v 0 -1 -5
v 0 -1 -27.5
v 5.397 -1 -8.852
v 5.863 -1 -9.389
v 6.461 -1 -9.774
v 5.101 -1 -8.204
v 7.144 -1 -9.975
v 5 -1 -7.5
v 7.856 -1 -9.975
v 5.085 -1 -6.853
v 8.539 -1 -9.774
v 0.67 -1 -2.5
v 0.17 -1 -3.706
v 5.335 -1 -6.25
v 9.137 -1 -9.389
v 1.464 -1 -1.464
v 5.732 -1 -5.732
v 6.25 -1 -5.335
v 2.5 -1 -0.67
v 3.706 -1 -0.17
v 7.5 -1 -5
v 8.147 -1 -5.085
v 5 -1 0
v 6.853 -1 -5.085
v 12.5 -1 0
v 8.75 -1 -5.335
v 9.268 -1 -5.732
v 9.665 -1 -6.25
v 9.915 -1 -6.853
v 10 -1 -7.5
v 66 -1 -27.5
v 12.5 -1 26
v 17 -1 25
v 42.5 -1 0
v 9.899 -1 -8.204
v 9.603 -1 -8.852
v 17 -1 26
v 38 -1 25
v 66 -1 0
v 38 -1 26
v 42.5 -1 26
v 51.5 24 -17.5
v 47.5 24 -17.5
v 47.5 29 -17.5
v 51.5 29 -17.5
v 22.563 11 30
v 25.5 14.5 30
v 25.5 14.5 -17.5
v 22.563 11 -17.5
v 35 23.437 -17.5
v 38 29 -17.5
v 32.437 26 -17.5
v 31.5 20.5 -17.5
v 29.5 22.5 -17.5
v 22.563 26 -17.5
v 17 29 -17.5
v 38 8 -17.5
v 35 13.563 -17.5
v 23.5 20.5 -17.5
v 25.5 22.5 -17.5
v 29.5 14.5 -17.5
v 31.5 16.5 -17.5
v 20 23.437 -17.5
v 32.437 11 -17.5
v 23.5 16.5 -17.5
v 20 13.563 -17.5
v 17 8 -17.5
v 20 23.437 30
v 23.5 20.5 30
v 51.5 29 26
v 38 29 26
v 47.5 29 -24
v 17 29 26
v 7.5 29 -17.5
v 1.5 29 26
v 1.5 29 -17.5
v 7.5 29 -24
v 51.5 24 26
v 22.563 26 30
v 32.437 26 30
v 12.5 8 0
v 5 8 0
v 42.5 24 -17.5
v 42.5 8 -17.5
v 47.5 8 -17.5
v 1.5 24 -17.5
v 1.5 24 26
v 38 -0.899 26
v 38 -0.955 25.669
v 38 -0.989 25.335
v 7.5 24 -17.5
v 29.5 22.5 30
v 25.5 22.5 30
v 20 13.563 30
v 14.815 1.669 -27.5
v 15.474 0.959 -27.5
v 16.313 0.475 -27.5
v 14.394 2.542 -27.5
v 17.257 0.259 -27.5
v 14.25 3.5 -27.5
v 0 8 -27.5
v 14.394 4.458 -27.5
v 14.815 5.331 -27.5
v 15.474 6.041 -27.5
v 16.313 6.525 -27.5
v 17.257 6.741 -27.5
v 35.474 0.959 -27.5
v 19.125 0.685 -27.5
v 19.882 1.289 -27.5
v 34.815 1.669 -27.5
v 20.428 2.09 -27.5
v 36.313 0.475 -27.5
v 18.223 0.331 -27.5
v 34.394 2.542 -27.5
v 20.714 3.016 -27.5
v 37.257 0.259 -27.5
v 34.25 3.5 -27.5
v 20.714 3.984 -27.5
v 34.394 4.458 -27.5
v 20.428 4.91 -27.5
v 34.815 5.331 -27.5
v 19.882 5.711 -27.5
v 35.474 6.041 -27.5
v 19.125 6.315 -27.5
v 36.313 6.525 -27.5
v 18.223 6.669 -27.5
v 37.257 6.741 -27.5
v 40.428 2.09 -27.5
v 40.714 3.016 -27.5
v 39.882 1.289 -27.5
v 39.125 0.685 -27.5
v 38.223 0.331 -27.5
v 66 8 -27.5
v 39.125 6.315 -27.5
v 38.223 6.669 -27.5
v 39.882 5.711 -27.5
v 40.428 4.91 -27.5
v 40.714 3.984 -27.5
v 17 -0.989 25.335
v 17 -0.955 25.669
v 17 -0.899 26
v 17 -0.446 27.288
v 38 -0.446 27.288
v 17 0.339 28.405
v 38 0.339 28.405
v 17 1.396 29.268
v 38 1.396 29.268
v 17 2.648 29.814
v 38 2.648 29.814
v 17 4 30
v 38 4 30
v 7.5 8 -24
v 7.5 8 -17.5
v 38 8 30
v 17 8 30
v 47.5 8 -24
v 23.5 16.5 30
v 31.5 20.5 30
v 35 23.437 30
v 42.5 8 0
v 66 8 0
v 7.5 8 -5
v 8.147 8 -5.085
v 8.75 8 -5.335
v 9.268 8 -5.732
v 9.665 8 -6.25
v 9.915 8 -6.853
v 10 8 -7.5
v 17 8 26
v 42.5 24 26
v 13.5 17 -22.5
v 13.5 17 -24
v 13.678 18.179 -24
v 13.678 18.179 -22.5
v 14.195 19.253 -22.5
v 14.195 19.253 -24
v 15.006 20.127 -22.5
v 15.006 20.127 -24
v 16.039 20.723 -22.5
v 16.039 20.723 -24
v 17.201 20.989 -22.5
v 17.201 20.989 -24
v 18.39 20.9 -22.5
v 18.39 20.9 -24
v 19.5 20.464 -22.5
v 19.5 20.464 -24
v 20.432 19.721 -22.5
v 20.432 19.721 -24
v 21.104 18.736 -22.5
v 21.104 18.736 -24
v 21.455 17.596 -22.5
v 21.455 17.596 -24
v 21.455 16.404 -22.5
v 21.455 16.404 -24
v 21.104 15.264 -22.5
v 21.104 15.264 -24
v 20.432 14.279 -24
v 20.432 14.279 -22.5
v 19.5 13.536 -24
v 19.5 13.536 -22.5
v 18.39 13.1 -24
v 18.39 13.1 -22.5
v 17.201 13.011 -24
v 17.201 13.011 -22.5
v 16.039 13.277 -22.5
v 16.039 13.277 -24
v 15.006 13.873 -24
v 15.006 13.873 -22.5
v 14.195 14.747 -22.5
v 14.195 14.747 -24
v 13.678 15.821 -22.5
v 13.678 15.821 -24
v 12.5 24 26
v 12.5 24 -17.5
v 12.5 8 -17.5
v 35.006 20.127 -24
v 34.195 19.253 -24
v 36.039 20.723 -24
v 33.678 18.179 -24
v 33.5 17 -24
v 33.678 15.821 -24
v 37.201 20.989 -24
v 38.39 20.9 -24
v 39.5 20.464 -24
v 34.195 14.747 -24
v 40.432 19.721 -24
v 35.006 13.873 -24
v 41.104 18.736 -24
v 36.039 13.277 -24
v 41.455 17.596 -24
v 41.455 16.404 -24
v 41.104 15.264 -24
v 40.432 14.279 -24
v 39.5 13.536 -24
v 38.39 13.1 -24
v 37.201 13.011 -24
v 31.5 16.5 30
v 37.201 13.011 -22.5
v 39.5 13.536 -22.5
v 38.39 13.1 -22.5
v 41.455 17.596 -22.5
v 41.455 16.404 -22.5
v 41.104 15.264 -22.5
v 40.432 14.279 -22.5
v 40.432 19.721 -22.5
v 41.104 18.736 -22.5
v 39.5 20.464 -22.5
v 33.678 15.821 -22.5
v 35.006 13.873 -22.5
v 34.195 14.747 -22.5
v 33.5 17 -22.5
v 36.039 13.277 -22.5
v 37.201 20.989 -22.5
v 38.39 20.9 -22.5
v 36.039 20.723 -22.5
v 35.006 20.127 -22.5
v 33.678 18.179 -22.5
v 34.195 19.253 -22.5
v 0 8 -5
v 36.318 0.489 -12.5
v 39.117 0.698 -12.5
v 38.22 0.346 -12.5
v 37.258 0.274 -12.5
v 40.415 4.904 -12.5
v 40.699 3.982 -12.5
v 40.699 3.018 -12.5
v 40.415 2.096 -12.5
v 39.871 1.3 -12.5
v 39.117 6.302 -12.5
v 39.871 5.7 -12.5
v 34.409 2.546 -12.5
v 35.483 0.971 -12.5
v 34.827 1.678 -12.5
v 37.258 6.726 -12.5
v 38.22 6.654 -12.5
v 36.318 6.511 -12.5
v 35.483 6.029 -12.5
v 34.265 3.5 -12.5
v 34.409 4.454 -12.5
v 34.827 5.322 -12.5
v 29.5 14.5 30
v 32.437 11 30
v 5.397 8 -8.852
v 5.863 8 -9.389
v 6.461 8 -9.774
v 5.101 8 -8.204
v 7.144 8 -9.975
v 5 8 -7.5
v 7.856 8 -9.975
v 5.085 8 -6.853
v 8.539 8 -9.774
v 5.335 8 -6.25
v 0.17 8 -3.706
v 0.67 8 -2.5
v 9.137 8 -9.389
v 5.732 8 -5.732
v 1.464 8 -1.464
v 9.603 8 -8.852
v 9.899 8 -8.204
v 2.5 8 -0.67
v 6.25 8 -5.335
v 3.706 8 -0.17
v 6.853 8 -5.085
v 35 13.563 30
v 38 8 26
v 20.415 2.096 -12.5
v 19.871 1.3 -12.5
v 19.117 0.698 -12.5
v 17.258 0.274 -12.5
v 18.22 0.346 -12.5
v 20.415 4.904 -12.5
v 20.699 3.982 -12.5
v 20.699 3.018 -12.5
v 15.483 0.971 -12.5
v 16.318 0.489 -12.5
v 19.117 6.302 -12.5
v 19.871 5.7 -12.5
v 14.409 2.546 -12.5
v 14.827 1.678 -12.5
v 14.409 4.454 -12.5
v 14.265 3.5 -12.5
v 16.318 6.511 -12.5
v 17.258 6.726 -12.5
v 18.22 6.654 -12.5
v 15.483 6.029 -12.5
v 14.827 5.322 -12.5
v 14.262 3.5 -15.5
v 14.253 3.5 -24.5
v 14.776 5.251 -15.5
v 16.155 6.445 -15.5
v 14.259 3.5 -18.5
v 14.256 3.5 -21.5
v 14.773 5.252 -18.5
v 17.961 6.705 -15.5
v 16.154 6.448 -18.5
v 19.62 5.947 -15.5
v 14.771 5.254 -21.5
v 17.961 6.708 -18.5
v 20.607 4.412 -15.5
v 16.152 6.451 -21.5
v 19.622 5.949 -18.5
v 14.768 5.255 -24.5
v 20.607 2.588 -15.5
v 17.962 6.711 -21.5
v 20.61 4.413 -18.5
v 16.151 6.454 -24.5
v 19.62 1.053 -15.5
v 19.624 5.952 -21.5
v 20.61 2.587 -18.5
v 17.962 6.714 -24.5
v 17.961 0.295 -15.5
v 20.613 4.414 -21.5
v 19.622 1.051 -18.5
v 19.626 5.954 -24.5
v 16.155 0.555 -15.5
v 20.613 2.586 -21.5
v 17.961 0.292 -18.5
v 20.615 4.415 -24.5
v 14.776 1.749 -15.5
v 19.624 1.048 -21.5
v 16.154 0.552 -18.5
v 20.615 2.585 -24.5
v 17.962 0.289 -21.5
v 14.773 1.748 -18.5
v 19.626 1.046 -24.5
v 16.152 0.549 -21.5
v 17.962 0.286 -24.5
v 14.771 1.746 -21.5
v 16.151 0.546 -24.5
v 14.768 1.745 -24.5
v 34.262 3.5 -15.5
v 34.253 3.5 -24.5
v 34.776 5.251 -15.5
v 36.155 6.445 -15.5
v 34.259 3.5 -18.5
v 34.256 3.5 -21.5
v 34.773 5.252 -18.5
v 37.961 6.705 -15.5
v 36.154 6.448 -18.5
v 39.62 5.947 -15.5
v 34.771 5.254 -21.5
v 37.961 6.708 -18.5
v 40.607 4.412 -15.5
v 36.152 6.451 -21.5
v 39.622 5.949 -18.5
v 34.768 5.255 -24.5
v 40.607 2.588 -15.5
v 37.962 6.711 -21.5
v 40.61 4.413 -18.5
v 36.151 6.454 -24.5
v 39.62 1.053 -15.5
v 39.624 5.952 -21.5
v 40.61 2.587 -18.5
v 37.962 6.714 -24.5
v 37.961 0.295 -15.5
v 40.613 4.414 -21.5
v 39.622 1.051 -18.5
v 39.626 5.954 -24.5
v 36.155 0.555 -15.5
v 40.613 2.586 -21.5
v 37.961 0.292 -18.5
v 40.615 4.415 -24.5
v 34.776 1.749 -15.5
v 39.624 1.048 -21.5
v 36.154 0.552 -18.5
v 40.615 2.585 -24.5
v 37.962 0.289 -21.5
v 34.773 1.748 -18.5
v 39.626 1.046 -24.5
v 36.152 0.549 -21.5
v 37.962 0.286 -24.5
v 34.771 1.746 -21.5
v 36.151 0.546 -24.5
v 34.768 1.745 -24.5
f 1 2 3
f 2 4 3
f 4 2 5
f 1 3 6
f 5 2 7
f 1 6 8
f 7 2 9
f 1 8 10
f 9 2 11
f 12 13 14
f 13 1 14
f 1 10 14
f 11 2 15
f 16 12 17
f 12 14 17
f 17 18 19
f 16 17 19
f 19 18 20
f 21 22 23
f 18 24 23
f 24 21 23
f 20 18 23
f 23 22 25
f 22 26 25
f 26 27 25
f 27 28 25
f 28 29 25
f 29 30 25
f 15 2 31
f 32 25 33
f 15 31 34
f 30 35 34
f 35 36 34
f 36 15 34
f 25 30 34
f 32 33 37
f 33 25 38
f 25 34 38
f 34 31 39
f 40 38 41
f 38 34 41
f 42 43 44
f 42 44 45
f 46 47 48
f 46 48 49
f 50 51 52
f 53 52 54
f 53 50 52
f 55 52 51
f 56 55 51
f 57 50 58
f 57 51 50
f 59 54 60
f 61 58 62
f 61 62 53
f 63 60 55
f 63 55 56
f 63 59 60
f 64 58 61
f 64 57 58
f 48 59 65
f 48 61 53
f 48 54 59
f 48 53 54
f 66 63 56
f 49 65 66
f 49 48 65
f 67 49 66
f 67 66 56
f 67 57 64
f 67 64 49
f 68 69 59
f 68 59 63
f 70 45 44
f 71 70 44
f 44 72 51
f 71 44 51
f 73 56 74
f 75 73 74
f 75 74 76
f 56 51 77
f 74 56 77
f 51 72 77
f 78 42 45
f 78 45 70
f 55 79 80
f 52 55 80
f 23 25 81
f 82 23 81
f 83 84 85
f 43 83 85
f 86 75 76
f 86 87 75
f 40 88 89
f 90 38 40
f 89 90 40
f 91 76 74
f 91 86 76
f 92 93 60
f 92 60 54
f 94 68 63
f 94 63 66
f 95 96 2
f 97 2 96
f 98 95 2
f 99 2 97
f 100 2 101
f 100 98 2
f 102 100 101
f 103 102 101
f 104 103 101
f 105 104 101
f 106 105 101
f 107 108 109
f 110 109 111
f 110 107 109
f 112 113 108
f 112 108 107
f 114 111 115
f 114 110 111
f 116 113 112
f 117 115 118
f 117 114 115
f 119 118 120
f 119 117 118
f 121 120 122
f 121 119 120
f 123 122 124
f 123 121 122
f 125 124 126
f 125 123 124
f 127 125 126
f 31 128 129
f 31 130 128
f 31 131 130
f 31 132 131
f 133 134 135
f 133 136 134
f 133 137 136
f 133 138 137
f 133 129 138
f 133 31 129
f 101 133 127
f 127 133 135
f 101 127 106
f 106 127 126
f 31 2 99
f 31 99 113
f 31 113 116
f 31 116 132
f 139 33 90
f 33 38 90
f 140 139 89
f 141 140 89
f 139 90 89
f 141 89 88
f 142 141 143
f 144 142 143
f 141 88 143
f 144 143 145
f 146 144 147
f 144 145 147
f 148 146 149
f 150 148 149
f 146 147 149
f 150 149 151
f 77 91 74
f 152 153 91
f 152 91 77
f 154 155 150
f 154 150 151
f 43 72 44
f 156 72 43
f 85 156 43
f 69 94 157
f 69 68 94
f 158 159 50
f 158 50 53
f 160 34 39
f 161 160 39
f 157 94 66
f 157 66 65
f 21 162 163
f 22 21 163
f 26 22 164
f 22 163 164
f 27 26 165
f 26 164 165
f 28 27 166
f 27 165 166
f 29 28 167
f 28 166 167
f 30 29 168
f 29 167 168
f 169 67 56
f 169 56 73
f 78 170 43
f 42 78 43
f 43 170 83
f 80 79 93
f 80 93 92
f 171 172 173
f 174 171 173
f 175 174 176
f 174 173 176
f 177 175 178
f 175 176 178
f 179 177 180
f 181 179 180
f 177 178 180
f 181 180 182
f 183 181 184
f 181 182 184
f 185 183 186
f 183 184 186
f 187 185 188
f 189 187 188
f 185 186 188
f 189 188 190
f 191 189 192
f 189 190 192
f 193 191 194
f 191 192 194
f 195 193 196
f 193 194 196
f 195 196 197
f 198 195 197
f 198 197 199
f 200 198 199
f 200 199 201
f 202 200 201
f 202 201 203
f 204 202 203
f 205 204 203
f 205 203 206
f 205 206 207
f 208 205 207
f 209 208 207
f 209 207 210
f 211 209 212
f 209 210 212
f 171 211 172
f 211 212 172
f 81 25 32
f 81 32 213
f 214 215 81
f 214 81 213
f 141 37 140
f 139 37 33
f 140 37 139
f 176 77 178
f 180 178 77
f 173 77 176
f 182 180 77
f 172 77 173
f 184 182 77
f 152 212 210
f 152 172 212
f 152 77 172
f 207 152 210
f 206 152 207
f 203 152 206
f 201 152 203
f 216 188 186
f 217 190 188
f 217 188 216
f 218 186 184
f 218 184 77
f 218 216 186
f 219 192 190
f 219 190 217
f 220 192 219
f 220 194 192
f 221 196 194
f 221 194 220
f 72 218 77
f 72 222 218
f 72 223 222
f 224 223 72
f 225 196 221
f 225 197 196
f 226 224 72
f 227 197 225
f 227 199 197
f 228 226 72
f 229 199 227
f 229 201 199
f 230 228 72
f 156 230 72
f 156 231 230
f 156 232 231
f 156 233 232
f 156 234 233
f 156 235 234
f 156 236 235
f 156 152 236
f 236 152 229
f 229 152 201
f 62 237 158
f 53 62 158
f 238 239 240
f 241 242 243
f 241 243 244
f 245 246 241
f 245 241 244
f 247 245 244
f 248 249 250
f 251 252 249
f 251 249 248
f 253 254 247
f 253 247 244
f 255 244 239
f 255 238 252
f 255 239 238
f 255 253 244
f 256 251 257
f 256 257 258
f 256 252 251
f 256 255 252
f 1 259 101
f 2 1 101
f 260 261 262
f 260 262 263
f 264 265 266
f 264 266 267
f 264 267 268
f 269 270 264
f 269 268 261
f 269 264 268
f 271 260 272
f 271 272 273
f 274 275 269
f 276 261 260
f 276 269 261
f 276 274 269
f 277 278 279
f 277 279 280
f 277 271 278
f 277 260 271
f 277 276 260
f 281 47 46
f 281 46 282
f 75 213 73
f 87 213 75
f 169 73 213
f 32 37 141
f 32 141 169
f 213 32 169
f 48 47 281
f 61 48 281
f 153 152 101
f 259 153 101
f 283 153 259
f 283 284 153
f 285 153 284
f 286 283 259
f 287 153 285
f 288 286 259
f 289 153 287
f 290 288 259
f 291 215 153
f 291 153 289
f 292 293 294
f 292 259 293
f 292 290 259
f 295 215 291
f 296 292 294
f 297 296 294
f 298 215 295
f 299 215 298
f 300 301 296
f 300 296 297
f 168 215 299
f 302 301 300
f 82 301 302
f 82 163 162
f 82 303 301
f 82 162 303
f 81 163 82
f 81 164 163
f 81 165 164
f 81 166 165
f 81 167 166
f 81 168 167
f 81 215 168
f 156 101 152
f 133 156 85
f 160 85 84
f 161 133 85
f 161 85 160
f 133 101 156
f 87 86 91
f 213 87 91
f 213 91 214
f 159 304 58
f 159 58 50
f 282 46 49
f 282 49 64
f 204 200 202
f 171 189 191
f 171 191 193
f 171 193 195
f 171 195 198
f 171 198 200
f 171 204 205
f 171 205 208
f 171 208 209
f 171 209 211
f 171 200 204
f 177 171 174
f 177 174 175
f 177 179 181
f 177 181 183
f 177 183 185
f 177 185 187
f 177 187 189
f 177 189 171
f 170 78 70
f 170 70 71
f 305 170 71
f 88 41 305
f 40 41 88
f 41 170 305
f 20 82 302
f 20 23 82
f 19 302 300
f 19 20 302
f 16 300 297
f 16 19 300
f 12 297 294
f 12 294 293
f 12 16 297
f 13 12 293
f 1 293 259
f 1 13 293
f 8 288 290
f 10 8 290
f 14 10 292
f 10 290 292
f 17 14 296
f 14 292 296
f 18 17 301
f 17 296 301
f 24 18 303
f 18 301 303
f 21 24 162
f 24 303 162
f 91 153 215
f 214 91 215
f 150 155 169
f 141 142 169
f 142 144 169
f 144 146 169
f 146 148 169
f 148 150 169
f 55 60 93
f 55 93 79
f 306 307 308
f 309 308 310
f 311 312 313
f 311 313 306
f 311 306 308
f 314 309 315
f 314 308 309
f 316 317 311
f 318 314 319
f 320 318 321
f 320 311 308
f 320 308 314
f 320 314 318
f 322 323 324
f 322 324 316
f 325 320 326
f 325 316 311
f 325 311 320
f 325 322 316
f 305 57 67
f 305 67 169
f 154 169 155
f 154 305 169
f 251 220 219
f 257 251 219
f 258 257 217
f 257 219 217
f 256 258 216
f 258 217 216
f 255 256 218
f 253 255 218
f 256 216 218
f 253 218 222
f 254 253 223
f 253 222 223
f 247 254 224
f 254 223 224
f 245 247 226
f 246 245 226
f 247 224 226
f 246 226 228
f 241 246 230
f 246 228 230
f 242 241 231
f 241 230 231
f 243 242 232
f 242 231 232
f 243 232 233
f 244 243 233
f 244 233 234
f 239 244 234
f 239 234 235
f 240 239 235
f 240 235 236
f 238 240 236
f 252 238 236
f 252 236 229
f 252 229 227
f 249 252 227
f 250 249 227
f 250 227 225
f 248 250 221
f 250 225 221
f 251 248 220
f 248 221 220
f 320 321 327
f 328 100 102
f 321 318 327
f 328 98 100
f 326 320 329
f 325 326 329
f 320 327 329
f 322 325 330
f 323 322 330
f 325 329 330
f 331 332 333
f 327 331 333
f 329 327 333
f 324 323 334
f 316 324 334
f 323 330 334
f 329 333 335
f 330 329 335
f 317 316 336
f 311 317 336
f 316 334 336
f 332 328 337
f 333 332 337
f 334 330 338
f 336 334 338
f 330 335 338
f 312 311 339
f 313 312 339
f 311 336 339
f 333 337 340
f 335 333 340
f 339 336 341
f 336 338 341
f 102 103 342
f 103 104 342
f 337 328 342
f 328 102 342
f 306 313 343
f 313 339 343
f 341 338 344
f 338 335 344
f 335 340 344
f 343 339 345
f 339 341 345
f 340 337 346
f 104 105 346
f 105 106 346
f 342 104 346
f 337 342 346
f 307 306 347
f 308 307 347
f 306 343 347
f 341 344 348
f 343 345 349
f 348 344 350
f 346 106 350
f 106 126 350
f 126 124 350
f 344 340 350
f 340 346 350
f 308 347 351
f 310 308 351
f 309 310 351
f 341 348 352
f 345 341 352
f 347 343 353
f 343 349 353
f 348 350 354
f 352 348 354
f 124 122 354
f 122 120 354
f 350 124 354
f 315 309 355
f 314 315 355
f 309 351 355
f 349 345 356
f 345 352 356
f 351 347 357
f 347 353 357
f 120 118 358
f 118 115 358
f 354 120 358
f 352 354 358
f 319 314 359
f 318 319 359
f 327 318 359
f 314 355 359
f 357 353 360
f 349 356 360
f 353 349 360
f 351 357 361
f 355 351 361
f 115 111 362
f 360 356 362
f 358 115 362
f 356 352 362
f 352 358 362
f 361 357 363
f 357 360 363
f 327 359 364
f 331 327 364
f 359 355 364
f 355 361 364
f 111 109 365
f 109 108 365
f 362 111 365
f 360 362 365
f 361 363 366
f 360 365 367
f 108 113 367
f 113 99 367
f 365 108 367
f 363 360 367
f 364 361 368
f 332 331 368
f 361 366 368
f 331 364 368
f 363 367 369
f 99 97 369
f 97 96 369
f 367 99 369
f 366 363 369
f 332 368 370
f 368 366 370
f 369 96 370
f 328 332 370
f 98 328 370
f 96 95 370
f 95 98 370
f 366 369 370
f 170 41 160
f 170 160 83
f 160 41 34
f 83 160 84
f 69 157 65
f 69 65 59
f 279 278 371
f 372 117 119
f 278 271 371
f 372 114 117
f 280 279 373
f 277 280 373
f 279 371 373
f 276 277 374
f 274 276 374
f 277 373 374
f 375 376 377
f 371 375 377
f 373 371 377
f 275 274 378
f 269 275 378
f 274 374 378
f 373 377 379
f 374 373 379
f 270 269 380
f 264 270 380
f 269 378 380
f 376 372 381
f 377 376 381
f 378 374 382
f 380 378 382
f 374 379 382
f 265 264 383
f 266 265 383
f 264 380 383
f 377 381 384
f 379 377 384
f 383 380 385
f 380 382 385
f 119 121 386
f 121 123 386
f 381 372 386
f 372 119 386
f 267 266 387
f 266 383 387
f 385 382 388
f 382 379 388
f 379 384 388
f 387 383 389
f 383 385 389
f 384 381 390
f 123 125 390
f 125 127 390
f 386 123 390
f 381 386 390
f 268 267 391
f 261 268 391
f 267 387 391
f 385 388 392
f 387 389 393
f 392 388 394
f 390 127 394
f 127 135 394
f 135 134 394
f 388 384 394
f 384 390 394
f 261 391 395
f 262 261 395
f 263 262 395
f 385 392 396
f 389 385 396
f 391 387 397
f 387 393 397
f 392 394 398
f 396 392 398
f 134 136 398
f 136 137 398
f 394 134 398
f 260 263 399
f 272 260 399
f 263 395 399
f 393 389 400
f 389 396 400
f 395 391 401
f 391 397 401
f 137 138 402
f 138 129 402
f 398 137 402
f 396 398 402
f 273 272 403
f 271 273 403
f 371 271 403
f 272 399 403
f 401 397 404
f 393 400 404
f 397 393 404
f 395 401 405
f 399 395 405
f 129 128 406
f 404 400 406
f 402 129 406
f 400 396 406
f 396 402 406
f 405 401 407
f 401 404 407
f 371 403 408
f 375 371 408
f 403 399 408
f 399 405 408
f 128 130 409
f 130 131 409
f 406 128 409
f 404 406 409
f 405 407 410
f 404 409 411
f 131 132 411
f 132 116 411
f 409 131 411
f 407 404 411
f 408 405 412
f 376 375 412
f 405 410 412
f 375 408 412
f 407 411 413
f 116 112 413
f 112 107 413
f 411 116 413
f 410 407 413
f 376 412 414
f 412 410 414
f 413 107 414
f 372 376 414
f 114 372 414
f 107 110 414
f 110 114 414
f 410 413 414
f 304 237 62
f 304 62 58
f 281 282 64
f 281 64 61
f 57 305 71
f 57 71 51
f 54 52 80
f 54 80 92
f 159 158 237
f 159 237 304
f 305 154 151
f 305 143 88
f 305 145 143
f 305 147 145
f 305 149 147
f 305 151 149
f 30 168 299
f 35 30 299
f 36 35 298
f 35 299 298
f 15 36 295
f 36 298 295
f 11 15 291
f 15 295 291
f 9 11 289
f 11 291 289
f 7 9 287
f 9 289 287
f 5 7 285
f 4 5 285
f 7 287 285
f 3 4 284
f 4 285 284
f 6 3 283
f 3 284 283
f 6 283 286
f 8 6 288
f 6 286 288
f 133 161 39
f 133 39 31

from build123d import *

# Parameters (mm, degrees)
BOSS_EXTRUDE2_DEPTH          = 8
BOSS_EXTRUDE2_DEPTH_BACK     = 1
SKETCH1_R                    = 2.5
CUT_EXTRUDE1_DEPTH           = 79.300702423
CUT_EXTRUDE1_DEPTH_BACK      = 79.300702423
SKETCH2_R                    = 2.5
SKETCH3_R                    = 3.25
CUT_EXTRUDE5_DEPTH           = 15
CUT_EXTRUDE5_DRAFT           = -0.0573
CUT_EXTRUDE5_PROFILE_2_DEPTH = 15
CUT_EXTRUDE5_PROFILE_2_DRAFT = -0.0573
SKETCH5_W                    = 9
SKETCH5_H                    = 6.5
BOSS_EXTRUDE3_DEPTH          = 14.5
CUT_EXTRUDE4_DEPTH           = 1.5
SKETCH12_W                   = 21
SKETCH12_H                   = 30
BOSS_EXTRUDE7_DEPTH          = 9
SKETCH15_W                   = 9
SKETCH15_H                   = 6.5
BOSS_EXTRUDE8_DEPTH          = 3.5
BOSS_EXTRUDE9_DEPTH          = 54
FILLET4_R                    = 5
SKETCH18_W                   = 9.873697418
SKETCH18_H                   = 6.5
BOSS_EXTRUDE11_DEPTH         = 0.5
SKETCH20_W                   = 4
SKETCH20_H                   = 17.5
BOSS_EXTRUDE12_DEPTH         = 18
BOSS_EXTRUDE13_DEPTH         = 11
BOSS_EXTRUDE13_DEPTH_BACK    = 4
SKETCH22_W                   = 17.5
SKETCH22_H                   = 4
SKETCH25_W                   = 2
SKETCH25_H                   = 17.5
BOSS_EXTRUDE14_DEPTH         = 41
SKETCH28_W                   = 41
SKETCH28_H                   = 45
BOSS_EXTRUDE15_DEPTH         = 2
SKETCH29_R                   = 1.75
CUT_EXTRUDE8_DEPTH           = 9
BOSS_EXTRUDE16_DEPTH         = 9
BOSS_EXTRUDE16_DEPTH_BACK    = 4
SKETCH30_W                   = 17.5
SKETCH30_H                   = 4
SKETCH31_R                   = 10
CUT_EXTRUDE9_DEPTH           = 9
SKETCH32_W                   = 13
SKETCH32_H                   = 4
BOSS_EXTRUDE17_DEPTH         = 23.5
SKETCH33_W                   = 0.5
SKETCH33_H                   = 17.5
BOSS_EXTRUDE18_DEPTH         = 20
BOSS_EXTRUDE19_DEPTH         = 26
SKETCH35_W                   = 9.873697418
SKETCH35_H                   = 0.5
BOSS_EXTRUDE20_DEPTH         = 47.5
BOSS_EXTRUDE21_DEPTH         = 47.5
SKETCH38_W                   = 0.419549816
SKETCH38_H                   = 18.5
CUT_EXTRUDE10_DEPTH          = 90.5
SKETCH46_W                   = 27.5
SKETCH46_H                   = 9
BOSS_EXTRUDE26_DEPTH         = 11.5
SKETCH47_W                   = 27.5
SKETCH47_H                   = 9
BOSS_EXTRUDE27_DEPTH         = 11
SKETCH48_W                   = 15.5
SKETCH48_H                   = 6.5
BOSS_EXTRUDE31_DEPTH         = 18.5
SKETCH50_R                   = 4
CUT_EXTRUDE11_DEPTH          = 1.5
SKETCH51_W                   = 9.626242636
SKETCH51_H                   = 9.125298808
BOSS_EXTRUDE32_DEPTH         = 1.5
SKETCH54_W                   = 8
SKETCH54_H                   = 8
BOSS_EXTRUDE35_DEPTH         = 47.5
SKETCH55_W                   = 9.873697418
SKETCH55_H                   = 0.5
CUT_EXTRUDE12_DEPTH          = 47.5
BOSS_EXTRUDE37_DEPTH         = 47.5
CUT_EXTRUDE17_DEPTH          = 47.5
SKETCH62_W                   = 8
SKETCH62_H                   = 8
CUT_EXTRUDE18_DEPTH          = 47.5
SKETCH63_W                   = 13
SKETCH63_H                   = 4
CUT_EXTRUDE20_DEPTH          = 17
SKETCH64_W                   = 0.5
SKETCH64_H                   = 1.5
BOSS_EXTRUDE38_DEPTH         = 6.5
SKETCH65_W                   = 11
SKETCH65_H                   = 27.5
SKETCH65_R                   = 2.5
CUT_EXTRUDE22_DEPTH          = 9
FILLET6_R                    = 5
BOSS_EXTRUDE39_DEPTH         = 11
BOSS_EXTRUDE39_DEPTH_BACK    = 10
SKETCH67_W                   = 27.5
SKETCH67_H                   = 9
SKETCH68_W                   = 2
SKETCH68_H                   = 45
CUT_EXTRUDE23_DEPTH          = 17
SKETCH69_W                   = 2
SKETCH69_H                   = 41
CUT_EXTRUDE24_DEPTH          = 37
CUT_EXTRUDE25_DEPTH          = 6.5
SKETCH71_W                   = 40
SKETCH71_H                   = 6.5
BOSS_EXTRUDE40_DEPTH         = 1.5
BOSS_EXTRUDE41_DEPTH         = 1


with BuildPart() as part:
    # Sketch1 → Boss-Extrude2 (new, two sides: drawn at the far end of the back side and taken through both)
    with BuildSketch(Plane(origin=(0, 0, 0), x_dir=(1, 0, 0), z_dir=(0, 1, 0)).offset(-BOSS_EXTRUDE2_DEPTH_BACK)):
        with BuildLine():
            Line((5, 0), (50, 0))
            ThreePointArc((50, 0), (53.535533906, 1.464466094), (55, 5))
            Line((55, 5), (55, 50))
            ThreePointArc((55, 50), (53.535533906, 53.535533906), (50, 55))
            Line((50, 55), (5, 55))
            ThreePointArc((5, 55), (1.464466094, 53.535533906), (0, 50))
            Line((0, 50), (0, 5))
            ThreePointArc((0, 5), (1.464466094, 1.464466094), (5, 0))
        make_face()
        with Locations((7.5, 47.5)):
            Circle(SKETCH1_R, mode=Mode.SUBTRACT)
        with Locations((47.5, 47.5)):
            Circle(SKETCH1_R, mode=Mode.SUBTRACT)
        with Locations((47.5, 7.5)):
            Circle(SKETCH1_R, mode=Mode.SUBTRACT)
        with Locations((7.5, 7.5)):
            Circle(SKETCH1_R, mode=Mode.SUBTRACT)
    extrude(amount=BOSS_EXTRUDE2_DEPTH + BOSS_EXTRUDE2_DEPTH_BACK)

    # Sketch2 → Cut-Extrude1 (cut, two sides: drawn at the far end of the back side and taken through both)
    with BuildSketch(Plane(origin=(0, 8, 0), x_dir=(1, 0, 0), z_dir=(0, 1, 0)).offset(-CUT_EXTRUDE1_DEPTH_BACK)):
        with BuildLine():
            Line((0, 50), (0, 27.5))
            Line((0, 27.5), (55, 27.5))
            Line((55, 27.5), (55, 50))
            ThreePointArc((55, 50), (53.535533906, 53.535533906), (50, 55))
            Line((50, 55), (5, 55))
            ThreePointArc((5, 55), (1.464466094, 53.535533906), (0, 50))
        make_face()
        with Locations((7.5, 47.5)):
            Circle(SKETCH2_R, mode=Mode.SUBTRACT)
        with Locations((47.5, 47.5)):
            Circle(SKETCH2_R, mode=Mode.SUBTRACT)
    extrude(amount=CUT_EXTRUDE1_DEPTH + CUT_EXTRUDE1_DEPTH_BACK, mode=Mode.SUBTRACT)


with BuildPart() as cut_extrude5_tool:
    # Sketch3 → Cut-Extrude5 (with draft: the straight prism first)
    with BuildSketch(Plane(origin=(0, 0, -27.5), x_dir=(-1, 0, 0), z_dir=(0, 0, -1))):
        with Locations((-37.5, 3.5)):
            Circle(SKETCH3_R)
    extrude(amount=-CUT_EXTRUDE5_DEPTH)
    # Cut-Extrude5: the draft: its side faces are tilted about the plane it starts from
    cut_extrude5_sides = [cut_extrude5_tool.faces().sort_by_distance(p)[0] for p in [
        (40.75, 3.5, -20),
    ]]
    draft(cut_extrude5_sides, Plane(origin=(0, 0, -27.5), x_dir=(-1, 0, 0), z_dir=(0, 0, -1)), CUT_EXTRUDE5_DRAFT)


with BuildPart() as part_1:
    add(part.part)

    # Cut-Extrude5: cut by cut_extrude5_tool
    add(cut_extrude5_tool.part, mode=Mode.SUBTRACT)


with BuildPart() as cut_extrude5_profile_2_tool:
    # Sketch3 → Cut-Extrude5 profile 2 (with draft: the straight prism first)
    with BuildSketch(Plane(origin=(0, 0, -27.5), x_dir=(-1, 0, 0), z_dir=(0, 0, -1))):
        with Locations((-17.5, 3.5)):
            Circle(SKETCH3_R)
    extrude(amount=-CUT_EXTRUDE5_PROFILE_2_DEPTH)
    # Cut-Extrude5 profile 2: the draft: its side faces are tilted about the plane it starts from
    cut_extrude5_profile_2_sides = [cut_extrude5_profile_2_tool.faces().sort_by_distance(p)[0] for p in [
        (20.75, 3.5, -20),
    ]]
    draft(cut_extrude5_profile_2_sides, Plane(origin=(0, 0, -27.5), x_dir=(-1, 0, 0), z_dir=(0, 0, -1)), CUT_EXTRUDE5_PROFILE_2_DRAFT)


with BuildPart() as part_2:
    add(part_1.part)

    # Cut-Extrude5 profile 2: cut by cut_extrude5_profile_2_tool
    add(cut_extrude5_profile_2_tool.part, mode=Mode.SUBTRACT)

    # Sketch5 → Boss-Extrude3 (add)
    with BuildSketch(Plane(origin=(0, 8, 0), x_dir=(1, 0, 0), z_dir=(0, 1, 0))):
        with Locations((27.5, 20.75)):
            Rectangle(SKETCH5_W, SKETCH5_H)
    extrude(amount=BOSS_EXTRUDE3_DEPTH)

    # Sketch6 → Cut-Extrude4 (cut)
    with BuildSketch(Plane(origin=(0, 0, -24), x_dir=(-1, 0, 0), z_dir=(0, 0, -1))):
        with BuildLine():
            ThreePointArc((-27.5, 13), (-24.671572875, 14.171572875), (-23.5, 17))
            ThreePointArc((-23.5, 17), (-30.328427125, 19.828427125), (-27.5, 13))
        make_face()
    extrude(amount=-CUT_EXTRUDE4_DEPTH, mode=Mode.SUBTRACT)

    # Sketch12 → Boss-Extrude7 (add)
    with BuildSketch(Plane(origin=(0, 8, 0), x_dir=(1, 0, 0), z_dir=(0, 1, 0))):
        with Locations((27.5, -15)):
            Rectangle(SKETCH12_W, SKETCH12_H)
    extrude(amount=-BOSS_EXTRUDE7_DEPTH)

    # Sketch15 → Boss-Extrude8 (add)
    with BuildSketch(Plane(origin=(0, 22.5, 0), x_dir=(1, 0, 0), z_dir=(0, 1, 0))):
        with Locations((27.5, 20.75)):
            Rectangle(SKETCH15_W, SKETCH15_H)
    extrude(amount=BOSS_EXTRUDE8_DEPTH)

    # Sketch11 → Boss-Extrude9 (add)
    with BuildSketch(Plane(origin=(0, 0, -24), x_dir=(-1, 0, 0), z_dir=(0, 0, -1))):
        Polygon((-29.5, 22.5), (-25.5, 22.5), (-22.563151291, 26), (-32.436848709, 26), align=None)
    extrude(amount=-BOSS_EXTRUDE9_DEPTH)

    # Fillet4
    fillet4_edges = [part_2.edges().sort_by_distance(p)[0] for p in [
        (27.5, -1, 30),
    ]]
    fillet(fillet4_edges, radius=FILLET4_R)

    # Sketch18 → Boss-Extrude11 (add)
    with BuildSketch(Plane(origin=(0, 26, 0), x_dir=(1, 0, 0), z_dir=(0, 1, 0))):
        with Locations((27.5, 20.75)):
            Rectangle(SKETCH18_W, SKETCH18_H)
    extrude(amount=BOSS_EXTRUDE11_DEPTH)

    # Sketch20 → Boss-Extrude12 (add)
    with BuildSketch(Plane(origin=(0, 8, 0), x_dir=(1, 0, 0), z_dir=(0, 1, 0))):
        with Locations((14.5, 8.75)):
            Rectangle(SKETCH20_W, SKETCH20_H)
        with Locations((40.5, 8.75)):
            Rectangle(SKETCH20_W, SKETCH20_H)
    extrude(amount=BOSS_EXTRUDE12_DEPTH)

    # Sketch22 → Boss-Extrude13 (add, two sides: drawn at the far end of the back side and taken through both)
    with BuildSketch(Plane.ZY.offset(-12.5).offset(-BOSS_EXTRUDE13_DEPTH_BACK)):
        with Locations((-8.75, 26)):
            Rectangle(SKETCH22_W, SKETCH22_H)
    extrude(amount=BOSS_EXTRUDE13_DEPTH + BOSS_EXTRUDE13_DEPTH_BACK)

    # Sketch25 → Boss-Extrude14 (add)
    with BuildSketch(Plane(origin=(0, 28, 0), x_dir=(1, 0, 0), z_dir=(0, 1, 0))):
        with Locations((2.5, 8.75)):
            Rectangle(SKETCH25_W, SKETCH25_H)
    extrude(amount=BOSS_EXTRUDE14_DEPTH)

    # Sketch28 → Boss-Extrude15 (add)
    with BuildSketch(Plane.ZY.offset(-1.5)):
        with Locations((-20.5, 46.5)):
            Rectangle(SKETCH28_W, SKETCH28_H)
    extrude(amount=-BOSS_EXTRUDE15_DEPTH)

    # Sketch29 → Cut-Extrude8 (cut)
    with BuildSketch(Plane.ZY.offset(-1.5)):
        with Locations((-5, 33)):
            Circle(SKETCH29_R)
        with Locations((-36, 33)):
            Circle(SKETCH29_R)
        with Locations((-36, 64)):
            Circle(SKETCH29_R)
        with Locations((-5, 64)):
            Circle(SKETCH29_R)
    extrude(amount=-CUT_EXTRUDE8_DEPTH, mode=Mode.SUBTRACT)

    # Sketch30 → Boss-Extrude16 (add, two sides: drawn at the far end of the back side and taken through both)
    with BuildSketch(Plane(origin=(42.5, 0, 0), x_dir=(0, 0, -1), z_dir=(1, 0, 0)).offset(-BOSS_EXTRUDE16_DEPTH_BACK)):
        with Locations((8.75, 26)):
            Rectangle(SKETCH30_W, SKETCH30_H)
    extrude(amount=BOSS_EXTRUDE16_DEPTH + BOSS_EXTRUDE16_DEPTH_BACK)

    # Sketch31 → Cut-Extrude9 (cut)
    with BuildSketch(Plane(origin=(3.5, 0, 0), x_dir=(0, 0, -1), z_dir=(1, 0, 0))):
        with Locations((20.5, 47)):
            Circle(SKETCH31_R)
    extrude(amount=-CUT_EXTRUDE9_DEPTH, mode=Mode.SUBTRACT)

    # Sketch32 → Boss-Extrude17 (add)
    with BuildSketch(Plane(origin=(0, 0, -17.5), x_dir=(-1, 0, 0), z_dir=(0, 0, -1))):
        with Locations((-10, 26)):
            Rectangle(SKETCH32_W, SKETCH32_H)
    extrude(amount=BOSS_EXTRUDE17_DEPTH)

    # Sketch33 → Boss-Extrude18 (add)
    with BuildSketch(Plane(origin=(0, 8, 0), x_dir=(1, 0, 0), z_dir=(0, 1, 0))):
        with Locations((38.25, 8.75)):
            Rectangle(SKETCH33_W, SKETCH33_H)
        with Locations((16.75, 8.75)):
            Rectangle(SKETCH33_W, SKETCH33_H)
    extrude(amount=BOSS_EXTRUDE18_DEPTH)

    # Sketch34 → Boss-Extrude19 (add)
    with BuildSketch(Plane.XY):
        Polygon((51.5, 24), (51.5, 28), (38, 28), (38, -1), (42.5, -1), (42.5, 24), align=None)
        Polygon((17, 28), (1.5, 28), (1.5, 24), (12.5, 24), (12.5, -1), (17, -1), align=None)
    extrude(amount=BOSS_EXTRUDE19_DEPTH)

    # Sketch35 → Boss-Extrude20 (add)
    with BuildSketch(Plane.XY.offset(-17.5)):
        with Locations((27.5, 26.25)):
            Rectangle(SKETCH35_W, SKETCH35_H)
    extrude(amount=BOSS_EXTRUDE20_DEPTH)

    # Sketch37 → Boss-Extrude21 (add)
    with BuildSketch(Plane.XY.offset(-17.5)):
        Polygon((29.5, 12), (25.5, 12), (21.863844179, 7.666598237), (33.136155821, 7.666598237), align=None)
    extrude(amount=BOSS_EXTRUDE21_DEPTH)

    # Sketch38 → Cut-Extrude10 (cut)
    with BuildSketch(Plane.XY.offset(30)):
        with Locations((22.353376383, 17.25)):
            Rectangle(SKETCH38_W, SKETCH38_H)
        with Locations((32.646623617, 17.25)):
            Rectangle(SKETCH38_W, SKETCH38_H)
    extrude(amount=-CUT_EXTRUDE10_DEPTH, mode=Mode.SUBTRACT)

    # Sketch46 → Boss-Extrude26 (add)
    with BuildSketch(Plane.ZY):
        with Locations((-13.75, 3.5)):
            Rectangle(SKETCH46_W, SKETCH46_H)
    extrude(amount=-BOSS_EXTRUDE26_DEPTH)

    # Sketch47 → Boss-Extrude27 (add)
    with BuildSketch(Plane.ZY):
        with Locations((-13.75, 3.5)):
            Rectangle(SKETCH47_W, SKETCH47_H)
    extrude(amount=BOSS_EXTRUDE27_DEPTH)

    # Sketch48 → Boss-Extrude31 (add)
    with BuildSketch(Plane(origin=(0, 8, 0), x_dir=(1, 0, 0), z_dir=(0, 1, 0))):
        with Locations((15.25, 20.75)):
            Rectangle(SKETCH48_W, SKETCH48_H)
        with Locations((39.75, 20.75)):
            Rectangle(SKETCH48_W, SKETCH48_H)
    extrude(amount=BOSS_EXTRUDE31_DEPTH)

    # Sketch50 → Cut-Extrude11 (cut)
    with BuildSketch(Plane(origin=(0, 0, -24), x_dir=(-1, 0, 0), z_dir=(0, 0, -1))):
        with Locations((-17.5, 17)):
            Circle(SKETCH50_R)
        with Locations((-37.5, 17)):
            Circle(SKETCH50_R)
    extrude(amount=-CUT_EXTRUDE11_DEPTH, mode=Mode.SUBTRACT)

    # Sketch51 → Boss-Extrude32 (add)
    with BuildSketch(Plane(origin=(0, 0, -24), x_dir=(-1, 0, 0), z_dir=(0, 0, -1))):
        with Locations((-27.646184708, 17.114099589)):
            Rectangle(SKETCH51_W, SKETCH51_H)
    extrude(amount=-BOSS_EXTRUDE32_DEPTH)

    # Sketch54 → Boss-Extrude35 (add)
    with BuildSketch(Plane.XY.offset(-17.5)):
        with Locations((27.5, 18.5)):
            Rectangle(SKETCH54_W, SKETCH54_H)
    extrude(amount=BOSS_EXTRUDE35_DEPTH)

    # Sketch55 → Cut-Extrude12 (cut)
    with BuildSketch(Plane.XY.offset(30)):
        with Locations((27.5, 26.25)):
            Rectangle(SKETCH55_W, SKETCH55_H)
    extrude(amount=-CUT_EXTRUDE12_DEPTH, mode=Mode.SUBTRACT)

    # Sketch57 → Boss-Extrude37 (add)
    with BuildSketch(Plane.XY.offset(30)):
        Polygon((35, 23.436848709), (31.5, 20.5), (31.5, 16.5), (35, 13.563151291), align=None)
        Polygon((20, 13.563151291), (23.5, 16.5), (23.5, 20.5), (20, 23.436848709), align=None)
        Polygon((32.436848709, 11), (29.5, 14.5), (25.5, 14.5), (22.563151291, 11), align=None)
    extrude(amount=-BOSS_EXTRUDE37_DEPTH)

    # Sketch61 → Cut-Extrude17 (cut)
    with BuildSketch(Plane.XY.offset(30)):
        Polygon((32.436848709, 8), (22.563151291, 8), (22.563151291, 8.5), (24.660900369, 11), (30.339099631, 11), (32.436848709, 8.5), align=None)
    extrude(amount=-CUT_EXTRUDE17_DEPTH, mode=Mode.SUBTRACT)

    # Sketch62 → Cut-Extrude18 (cut)
    with BuildSketch(Plane.XY.offset(30)):
        with Locations((27.5, 18.5)):
            Rectangle(SKETCH62_W, SKETCH62_H)
    extrude(amount=-CUT_EXTRUDE18_DEPTH, mode=Mode.SUBTRACT)

    # Sketch63 → Cut-Extrude20 (cut)
    with BuildSketch(Plane(origin=(0, 0, -41), x_dir=(-1, 0, 0), z_dir=(0, 0, -1))):
        with Locations((-10, 26)):
            Rectangle(SKETCH63_W, SKETCH63_H)
    extrude(amount=-CUT_EXTRUDE20_DEPTH, mode=Mode.SUBTRACT)

    # Sketch64 → Boss-Extrude38 (add)
    with BuildSketch(Plane(origin=(0, 0, -17.5), x_dir=(-1, 0, 0), z_dir=(0, 0, -1))):
        with Locations((-16.75, 27.25)):
            Rectangle(SKETCH64_W, SKETCH64_H)
    extrude(amount=BOSS_EXTRUDE38_DEPTH)

    # Sketch65 → Cut-Extrude22 (cut)
    with BuildSketch(Plane(origin=(0, 8, 0), x_dir=(1, 0, 0), z_dir=(0, 1, 0))):
        with Locations((-5.5, 13.75)):
            Rectangle(SKETCH65_W, SKETCH65_H)
        with Locations((7.5, 7.5)):
            Circle(SKETCH65_R)
    extrude(amount=-CUT_EXTRUDE22_DEPTH, mode=Mode.SUBTRACT)

    # Fillet6
    fillet6_edges = [part_2.edges().sort_by_distance(p)[0] for p in [
        (0, 3.5, 0),
    ]]
    fillet(fillet6_edges, radius=FILLET6_R)

    # Sketch67 → Boss-Extrude39 (add, two sides: drawn at the far end of the back side and taken through both)
    with BuildSketch(Plane(origin=(55, 0, 0), x_dir=(0, 0, -1), z_dir=(1, 0, 0)).offset(-BOSS_EXTRUDE39_DEPTH_BACK)):
        with Locations((13.75, 3.5)):
            Rectangle(SKETCH67_W, SKETCH67_H)
    extrude(amount=BOSS_EXTRUDE39_DEPTH + BOSS_EXTRUDE39_DEPTH_BACK)

    # Sketch68 → Cut-Extrude23 (cut)
    with BuildSketch(Plane(origin=(0, 0, -41), x_dir=(-1, 0, 0), z_dir=(0, 0, -1))):
        with Locations((-2.5, 46.5)):
            Rectangle(SKETCH68_W, SKETCH68_H)
    extrude(amount=-CUT_EXTRUDE23_DEPTH, mode=Mode.SUBTRACT)

    # Sketch69 → Cut-Extrude24 (cut)
    with BuildSketch(Plane(origin=(0, 0, -24), x_dir=(-1, 0, 0), z_dir=(0, 0, -1))):
        with Locations((-2.5, 48.5)):
            Rectangle(SKETCH69_W, SKETCH69_H)
    extrude(amount=-CUT_EXTRUDE24_DEPTH, mode=Mode.SUBTRACT)

    # Sketch70 → Cut-Extrude25 (cut)
    with BuildSketch(Plane(origin=(0, 0, -24), x_dir=(-1, 0, 0), z_dir=(0, 0, -1))):
        Polygon((-17.5, 28), (-17.5, 26.5), (-7.5, 26.5), (-7.5, 24), (-1.5, 24), (-1.5, 28), align=None)
    extrude(amount=-CUT_EXTRUDE25_DEPTH, mode=Mode.SUBTRACT)

    # Sketch71 → Boss-Extrude40 (add)
    with BuildSketch(Plane(origin=(0, 26.5, 0), x_dir=(1, 0, 0), z_dir=(0, 1, 0))):
        with Locations((27.5, 20.75)):
            Rectangle(SKETCH71_W, SKETCH71_H)
    extrude(amount=BOSS_EXTRUDE40_DEPTH)

    # Sketch72 → Boss-Extrude41 (add)
    with BuildSketch(Plane(origin=(0, 28, 0), x_dir=(1, 0, 0), z_dir=(0, 1, 0))):
        Polygon((1.5, 17.5), (7.5, 17.5), (7.5, 24), (47.5, 24), (47.5, 17.5), (51.5, 17.5), (51.5, -26), (38, -26), (38, 17.5), (17, 17.5), (17, -26), (1.5, -26), align=None)
    extrude(amount=BOSS_EXTRUDE41_DEPTH)


solid = part_2.part
